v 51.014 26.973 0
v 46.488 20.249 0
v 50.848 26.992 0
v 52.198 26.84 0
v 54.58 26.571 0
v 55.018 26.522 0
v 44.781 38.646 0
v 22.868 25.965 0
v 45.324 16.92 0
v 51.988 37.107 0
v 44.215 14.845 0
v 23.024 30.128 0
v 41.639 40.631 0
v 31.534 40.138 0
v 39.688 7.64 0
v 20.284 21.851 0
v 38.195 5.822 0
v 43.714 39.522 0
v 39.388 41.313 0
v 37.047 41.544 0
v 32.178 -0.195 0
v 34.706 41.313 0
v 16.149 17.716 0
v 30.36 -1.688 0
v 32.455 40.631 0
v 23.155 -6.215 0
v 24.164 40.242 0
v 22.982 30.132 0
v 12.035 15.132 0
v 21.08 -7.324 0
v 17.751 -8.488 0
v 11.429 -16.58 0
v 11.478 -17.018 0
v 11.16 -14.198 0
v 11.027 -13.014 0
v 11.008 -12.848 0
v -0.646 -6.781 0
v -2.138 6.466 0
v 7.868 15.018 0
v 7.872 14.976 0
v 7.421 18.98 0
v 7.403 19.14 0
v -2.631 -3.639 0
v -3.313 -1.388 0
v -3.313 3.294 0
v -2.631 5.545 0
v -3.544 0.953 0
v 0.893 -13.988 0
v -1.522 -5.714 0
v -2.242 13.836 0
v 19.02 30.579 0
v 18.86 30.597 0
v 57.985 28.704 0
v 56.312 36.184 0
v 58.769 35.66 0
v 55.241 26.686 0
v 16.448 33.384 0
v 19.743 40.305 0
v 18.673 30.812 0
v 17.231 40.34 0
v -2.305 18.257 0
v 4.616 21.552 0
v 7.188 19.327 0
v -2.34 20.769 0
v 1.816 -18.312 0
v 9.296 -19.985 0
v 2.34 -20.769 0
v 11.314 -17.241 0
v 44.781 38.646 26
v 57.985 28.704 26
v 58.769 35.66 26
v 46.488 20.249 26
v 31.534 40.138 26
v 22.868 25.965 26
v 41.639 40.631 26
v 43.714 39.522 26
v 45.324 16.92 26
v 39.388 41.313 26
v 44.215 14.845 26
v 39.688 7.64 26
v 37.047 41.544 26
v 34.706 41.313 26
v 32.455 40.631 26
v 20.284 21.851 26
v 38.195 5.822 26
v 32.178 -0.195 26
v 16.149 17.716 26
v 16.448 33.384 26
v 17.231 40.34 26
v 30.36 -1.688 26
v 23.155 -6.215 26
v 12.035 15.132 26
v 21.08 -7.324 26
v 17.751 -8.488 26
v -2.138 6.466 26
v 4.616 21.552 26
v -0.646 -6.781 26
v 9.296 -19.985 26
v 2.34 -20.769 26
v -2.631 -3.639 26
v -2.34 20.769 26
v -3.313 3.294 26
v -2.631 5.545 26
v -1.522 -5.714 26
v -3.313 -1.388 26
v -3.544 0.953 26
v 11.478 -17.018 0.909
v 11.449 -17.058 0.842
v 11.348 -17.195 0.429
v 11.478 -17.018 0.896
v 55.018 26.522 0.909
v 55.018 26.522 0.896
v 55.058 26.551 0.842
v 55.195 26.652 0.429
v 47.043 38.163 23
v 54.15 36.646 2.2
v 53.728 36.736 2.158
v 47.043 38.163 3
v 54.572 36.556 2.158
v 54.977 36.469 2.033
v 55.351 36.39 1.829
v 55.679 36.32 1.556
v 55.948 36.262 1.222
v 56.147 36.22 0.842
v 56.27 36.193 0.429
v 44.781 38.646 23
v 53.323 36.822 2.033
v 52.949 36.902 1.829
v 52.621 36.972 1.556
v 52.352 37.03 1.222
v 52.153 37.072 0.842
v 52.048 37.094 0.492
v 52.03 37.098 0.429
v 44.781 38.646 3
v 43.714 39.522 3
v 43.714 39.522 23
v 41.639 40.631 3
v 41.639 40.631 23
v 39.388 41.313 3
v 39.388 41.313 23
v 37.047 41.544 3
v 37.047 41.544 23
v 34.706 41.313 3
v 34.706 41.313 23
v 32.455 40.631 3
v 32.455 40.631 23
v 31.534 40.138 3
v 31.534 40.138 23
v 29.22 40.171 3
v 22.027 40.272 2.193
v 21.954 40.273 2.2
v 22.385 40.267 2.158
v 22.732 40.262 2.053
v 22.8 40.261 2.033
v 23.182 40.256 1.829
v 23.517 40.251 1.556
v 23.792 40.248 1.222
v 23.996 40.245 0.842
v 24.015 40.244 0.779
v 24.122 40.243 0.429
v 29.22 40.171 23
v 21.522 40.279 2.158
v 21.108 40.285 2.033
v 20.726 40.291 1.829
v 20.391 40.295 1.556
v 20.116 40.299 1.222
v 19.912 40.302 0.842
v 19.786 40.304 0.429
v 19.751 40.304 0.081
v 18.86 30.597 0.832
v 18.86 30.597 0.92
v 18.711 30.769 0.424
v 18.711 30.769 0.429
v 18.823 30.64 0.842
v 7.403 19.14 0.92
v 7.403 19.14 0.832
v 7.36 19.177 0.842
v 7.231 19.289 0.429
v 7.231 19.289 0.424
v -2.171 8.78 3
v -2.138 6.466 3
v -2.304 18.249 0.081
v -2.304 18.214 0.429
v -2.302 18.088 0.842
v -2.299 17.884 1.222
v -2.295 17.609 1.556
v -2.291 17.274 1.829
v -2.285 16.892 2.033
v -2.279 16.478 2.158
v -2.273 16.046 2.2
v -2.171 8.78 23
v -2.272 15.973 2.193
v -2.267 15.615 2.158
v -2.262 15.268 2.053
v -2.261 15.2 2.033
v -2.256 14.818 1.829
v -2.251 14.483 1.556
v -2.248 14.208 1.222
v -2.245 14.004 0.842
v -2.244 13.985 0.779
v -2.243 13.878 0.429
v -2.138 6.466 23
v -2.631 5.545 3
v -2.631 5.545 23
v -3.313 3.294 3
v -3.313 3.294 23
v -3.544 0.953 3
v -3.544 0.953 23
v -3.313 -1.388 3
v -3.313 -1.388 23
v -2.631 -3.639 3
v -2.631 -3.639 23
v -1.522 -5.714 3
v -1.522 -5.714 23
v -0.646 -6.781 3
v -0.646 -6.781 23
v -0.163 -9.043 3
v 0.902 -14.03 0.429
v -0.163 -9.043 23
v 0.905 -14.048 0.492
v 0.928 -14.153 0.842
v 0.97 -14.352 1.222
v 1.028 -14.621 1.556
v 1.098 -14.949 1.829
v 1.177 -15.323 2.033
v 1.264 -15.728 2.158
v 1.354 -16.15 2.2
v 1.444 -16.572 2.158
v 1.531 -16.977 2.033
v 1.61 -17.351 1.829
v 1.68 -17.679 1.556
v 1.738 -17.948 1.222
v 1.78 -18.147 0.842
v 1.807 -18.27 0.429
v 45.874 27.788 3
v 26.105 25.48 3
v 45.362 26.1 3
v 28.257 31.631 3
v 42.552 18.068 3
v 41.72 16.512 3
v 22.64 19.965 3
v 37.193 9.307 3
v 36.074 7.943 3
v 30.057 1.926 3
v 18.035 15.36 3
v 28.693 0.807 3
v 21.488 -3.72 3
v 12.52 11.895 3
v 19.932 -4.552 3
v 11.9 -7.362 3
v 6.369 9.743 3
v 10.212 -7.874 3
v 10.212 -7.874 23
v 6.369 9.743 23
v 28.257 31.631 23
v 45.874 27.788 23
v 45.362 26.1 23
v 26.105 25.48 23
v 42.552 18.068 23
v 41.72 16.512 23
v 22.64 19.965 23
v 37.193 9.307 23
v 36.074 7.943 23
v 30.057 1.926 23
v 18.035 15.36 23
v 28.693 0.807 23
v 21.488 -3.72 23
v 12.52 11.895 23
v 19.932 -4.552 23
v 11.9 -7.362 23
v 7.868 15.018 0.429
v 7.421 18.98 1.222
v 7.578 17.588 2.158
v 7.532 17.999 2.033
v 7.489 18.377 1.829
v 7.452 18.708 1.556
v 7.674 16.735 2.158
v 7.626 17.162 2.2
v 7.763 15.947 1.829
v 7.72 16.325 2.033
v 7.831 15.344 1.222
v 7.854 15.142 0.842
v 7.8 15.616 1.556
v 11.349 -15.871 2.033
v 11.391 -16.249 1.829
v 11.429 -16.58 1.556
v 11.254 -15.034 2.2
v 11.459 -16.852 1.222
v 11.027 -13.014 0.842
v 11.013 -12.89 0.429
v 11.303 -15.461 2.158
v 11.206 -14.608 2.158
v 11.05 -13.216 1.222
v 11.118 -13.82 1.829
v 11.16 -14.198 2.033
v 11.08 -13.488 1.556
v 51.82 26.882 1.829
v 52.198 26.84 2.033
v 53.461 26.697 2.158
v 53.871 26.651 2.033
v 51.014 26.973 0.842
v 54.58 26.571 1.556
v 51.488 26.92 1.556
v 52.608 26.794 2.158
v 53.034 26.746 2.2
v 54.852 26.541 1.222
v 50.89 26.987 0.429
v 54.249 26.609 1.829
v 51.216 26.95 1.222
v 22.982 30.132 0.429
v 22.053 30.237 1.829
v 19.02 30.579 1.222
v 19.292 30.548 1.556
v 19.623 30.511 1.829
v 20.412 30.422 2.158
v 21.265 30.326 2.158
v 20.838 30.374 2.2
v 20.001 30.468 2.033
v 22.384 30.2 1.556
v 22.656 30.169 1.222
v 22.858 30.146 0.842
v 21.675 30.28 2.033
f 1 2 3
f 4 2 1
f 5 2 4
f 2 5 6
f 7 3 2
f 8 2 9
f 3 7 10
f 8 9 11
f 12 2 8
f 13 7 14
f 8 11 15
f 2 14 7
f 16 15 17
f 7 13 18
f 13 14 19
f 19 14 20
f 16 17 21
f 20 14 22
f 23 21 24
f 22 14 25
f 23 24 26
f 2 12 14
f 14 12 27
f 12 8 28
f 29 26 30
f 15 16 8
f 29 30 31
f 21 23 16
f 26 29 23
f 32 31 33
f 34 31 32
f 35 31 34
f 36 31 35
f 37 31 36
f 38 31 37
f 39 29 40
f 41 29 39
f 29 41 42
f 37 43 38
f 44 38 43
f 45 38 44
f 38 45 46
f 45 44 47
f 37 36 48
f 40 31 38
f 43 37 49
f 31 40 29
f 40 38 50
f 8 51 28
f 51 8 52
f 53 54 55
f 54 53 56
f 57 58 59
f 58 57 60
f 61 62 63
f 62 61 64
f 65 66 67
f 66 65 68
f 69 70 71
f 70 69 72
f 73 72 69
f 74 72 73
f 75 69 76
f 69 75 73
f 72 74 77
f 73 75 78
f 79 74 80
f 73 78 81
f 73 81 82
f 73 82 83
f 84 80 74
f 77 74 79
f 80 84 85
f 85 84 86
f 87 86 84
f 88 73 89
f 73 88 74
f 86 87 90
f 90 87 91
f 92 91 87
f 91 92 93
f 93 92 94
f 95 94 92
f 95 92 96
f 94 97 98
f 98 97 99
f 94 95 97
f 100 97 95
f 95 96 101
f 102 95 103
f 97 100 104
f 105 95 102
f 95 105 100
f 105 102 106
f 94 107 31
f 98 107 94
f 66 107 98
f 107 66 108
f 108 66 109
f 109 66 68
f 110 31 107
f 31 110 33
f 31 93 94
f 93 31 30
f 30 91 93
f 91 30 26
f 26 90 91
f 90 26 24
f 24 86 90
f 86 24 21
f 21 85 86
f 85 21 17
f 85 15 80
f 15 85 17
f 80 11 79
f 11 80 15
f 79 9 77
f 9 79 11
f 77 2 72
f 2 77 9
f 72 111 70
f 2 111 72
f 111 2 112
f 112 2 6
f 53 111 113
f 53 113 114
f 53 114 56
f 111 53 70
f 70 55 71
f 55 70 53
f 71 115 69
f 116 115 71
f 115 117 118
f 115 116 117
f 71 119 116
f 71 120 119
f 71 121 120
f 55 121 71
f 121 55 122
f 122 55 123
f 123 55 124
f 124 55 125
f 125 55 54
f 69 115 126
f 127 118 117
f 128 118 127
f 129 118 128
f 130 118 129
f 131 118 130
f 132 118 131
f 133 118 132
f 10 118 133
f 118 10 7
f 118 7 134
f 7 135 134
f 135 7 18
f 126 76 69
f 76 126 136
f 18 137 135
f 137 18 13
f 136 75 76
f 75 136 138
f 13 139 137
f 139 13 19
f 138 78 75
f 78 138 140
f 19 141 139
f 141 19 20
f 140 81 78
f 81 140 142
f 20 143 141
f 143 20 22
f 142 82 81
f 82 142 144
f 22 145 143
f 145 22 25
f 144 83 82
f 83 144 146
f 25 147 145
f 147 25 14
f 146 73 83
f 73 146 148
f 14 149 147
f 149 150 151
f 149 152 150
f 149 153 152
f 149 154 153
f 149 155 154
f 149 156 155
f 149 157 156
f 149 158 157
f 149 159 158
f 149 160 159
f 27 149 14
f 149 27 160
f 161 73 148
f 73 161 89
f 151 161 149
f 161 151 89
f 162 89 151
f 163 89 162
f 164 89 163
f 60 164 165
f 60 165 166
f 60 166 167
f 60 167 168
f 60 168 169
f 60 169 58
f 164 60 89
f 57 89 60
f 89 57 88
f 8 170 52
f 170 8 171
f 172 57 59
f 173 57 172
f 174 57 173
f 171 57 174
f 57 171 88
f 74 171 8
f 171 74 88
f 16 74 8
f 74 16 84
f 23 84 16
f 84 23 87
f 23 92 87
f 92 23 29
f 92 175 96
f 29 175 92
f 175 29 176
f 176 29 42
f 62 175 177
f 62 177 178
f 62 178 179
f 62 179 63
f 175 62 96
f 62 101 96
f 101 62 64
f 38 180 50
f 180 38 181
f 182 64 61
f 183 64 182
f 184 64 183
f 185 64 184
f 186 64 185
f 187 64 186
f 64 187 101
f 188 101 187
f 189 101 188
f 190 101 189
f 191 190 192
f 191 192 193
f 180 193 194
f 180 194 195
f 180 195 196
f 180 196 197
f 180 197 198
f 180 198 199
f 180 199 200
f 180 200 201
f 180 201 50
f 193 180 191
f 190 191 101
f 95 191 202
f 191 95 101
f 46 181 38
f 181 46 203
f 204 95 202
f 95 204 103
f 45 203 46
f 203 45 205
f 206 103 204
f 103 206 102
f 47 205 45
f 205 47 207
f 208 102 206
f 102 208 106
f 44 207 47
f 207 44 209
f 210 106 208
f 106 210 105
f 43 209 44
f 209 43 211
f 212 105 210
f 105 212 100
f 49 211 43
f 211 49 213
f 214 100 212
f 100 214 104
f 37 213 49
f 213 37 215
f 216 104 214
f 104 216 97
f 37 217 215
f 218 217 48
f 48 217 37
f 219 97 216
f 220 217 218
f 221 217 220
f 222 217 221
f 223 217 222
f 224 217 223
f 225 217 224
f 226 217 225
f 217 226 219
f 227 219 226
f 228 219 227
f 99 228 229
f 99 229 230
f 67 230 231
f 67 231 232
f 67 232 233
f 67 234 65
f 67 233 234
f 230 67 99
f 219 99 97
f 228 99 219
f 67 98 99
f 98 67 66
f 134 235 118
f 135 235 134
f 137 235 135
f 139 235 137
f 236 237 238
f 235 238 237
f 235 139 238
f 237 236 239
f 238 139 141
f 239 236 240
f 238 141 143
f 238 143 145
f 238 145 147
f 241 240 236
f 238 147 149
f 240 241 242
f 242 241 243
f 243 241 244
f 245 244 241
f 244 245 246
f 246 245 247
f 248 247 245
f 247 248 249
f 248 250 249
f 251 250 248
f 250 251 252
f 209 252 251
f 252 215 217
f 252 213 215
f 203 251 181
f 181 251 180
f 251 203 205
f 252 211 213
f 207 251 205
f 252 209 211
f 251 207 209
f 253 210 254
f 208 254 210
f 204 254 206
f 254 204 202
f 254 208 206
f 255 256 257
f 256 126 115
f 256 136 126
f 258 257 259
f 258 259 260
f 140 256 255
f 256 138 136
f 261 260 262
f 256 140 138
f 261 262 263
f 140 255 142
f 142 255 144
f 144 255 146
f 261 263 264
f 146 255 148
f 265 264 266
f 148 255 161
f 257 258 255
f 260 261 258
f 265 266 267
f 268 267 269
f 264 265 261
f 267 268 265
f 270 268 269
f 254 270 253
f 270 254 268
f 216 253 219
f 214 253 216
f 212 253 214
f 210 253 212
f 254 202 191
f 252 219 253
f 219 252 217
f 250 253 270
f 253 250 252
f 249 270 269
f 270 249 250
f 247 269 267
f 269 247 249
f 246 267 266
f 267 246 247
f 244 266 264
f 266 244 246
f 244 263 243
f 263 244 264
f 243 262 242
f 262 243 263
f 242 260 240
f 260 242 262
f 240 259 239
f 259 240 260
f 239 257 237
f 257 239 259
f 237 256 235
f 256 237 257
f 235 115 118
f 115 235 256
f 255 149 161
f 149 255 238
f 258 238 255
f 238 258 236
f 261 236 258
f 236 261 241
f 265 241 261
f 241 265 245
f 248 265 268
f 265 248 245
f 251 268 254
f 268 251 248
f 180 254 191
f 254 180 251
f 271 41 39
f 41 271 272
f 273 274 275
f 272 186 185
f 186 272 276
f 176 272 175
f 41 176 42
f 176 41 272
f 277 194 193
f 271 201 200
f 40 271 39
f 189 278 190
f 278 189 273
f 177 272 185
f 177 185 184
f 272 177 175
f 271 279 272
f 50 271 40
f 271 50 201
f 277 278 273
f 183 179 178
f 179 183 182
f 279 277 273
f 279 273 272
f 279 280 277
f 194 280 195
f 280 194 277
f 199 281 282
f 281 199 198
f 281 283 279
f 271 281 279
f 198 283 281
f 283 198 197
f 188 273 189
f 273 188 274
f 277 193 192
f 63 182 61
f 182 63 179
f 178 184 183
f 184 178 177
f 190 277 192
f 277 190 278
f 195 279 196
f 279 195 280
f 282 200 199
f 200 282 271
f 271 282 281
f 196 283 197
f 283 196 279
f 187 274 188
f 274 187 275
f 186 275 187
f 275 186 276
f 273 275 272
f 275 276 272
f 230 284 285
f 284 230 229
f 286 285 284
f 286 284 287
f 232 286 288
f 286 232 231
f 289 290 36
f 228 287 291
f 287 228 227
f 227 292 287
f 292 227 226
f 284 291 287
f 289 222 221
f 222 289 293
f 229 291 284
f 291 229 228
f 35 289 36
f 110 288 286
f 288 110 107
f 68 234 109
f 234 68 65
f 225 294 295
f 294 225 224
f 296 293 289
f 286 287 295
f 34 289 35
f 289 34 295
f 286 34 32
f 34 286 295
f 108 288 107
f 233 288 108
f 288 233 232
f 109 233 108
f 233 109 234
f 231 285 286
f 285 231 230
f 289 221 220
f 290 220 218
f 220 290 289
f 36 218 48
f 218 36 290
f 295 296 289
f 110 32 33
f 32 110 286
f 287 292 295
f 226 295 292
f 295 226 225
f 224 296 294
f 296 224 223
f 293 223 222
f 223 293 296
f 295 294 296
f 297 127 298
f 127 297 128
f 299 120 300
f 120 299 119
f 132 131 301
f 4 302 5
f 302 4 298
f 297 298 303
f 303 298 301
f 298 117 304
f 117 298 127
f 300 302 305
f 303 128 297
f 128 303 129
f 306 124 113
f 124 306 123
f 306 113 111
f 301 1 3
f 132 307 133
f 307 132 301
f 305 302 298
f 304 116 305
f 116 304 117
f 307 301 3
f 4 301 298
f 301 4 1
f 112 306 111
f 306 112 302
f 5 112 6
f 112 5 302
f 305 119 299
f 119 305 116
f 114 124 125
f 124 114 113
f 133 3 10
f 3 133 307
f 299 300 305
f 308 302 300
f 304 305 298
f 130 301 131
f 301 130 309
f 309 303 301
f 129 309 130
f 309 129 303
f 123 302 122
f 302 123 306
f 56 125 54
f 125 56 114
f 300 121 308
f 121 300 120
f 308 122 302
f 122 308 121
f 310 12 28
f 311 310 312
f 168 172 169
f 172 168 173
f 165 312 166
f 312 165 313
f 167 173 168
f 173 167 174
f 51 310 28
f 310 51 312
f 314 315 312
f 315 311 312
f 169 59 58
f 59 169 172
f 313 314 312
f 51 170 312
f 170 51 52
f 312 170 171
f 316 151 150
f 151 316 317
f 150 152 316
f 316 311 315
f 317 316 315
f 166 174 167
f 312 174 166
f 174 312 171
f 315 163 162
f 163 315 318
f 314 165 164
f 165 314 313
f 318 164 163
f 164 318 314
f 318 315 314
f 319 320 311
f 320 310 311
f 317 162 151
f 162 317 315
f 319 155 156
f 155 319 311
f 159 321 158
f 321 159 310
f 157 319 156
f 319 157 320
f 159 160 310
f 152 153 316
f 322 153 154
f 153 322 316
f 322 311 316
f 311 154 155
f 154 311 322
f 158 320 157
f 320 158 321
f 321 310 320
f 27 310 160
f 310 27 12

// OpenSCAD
$fn = 32;

// ----------------------------------------------------------------------
// Air duct: 24 mm duct, 3 mm wall, 26 mm across
// ----------------------------------------------------------------------

// --- parameters (mm) ---
duct_r = 12;              // duct core radius
duct_d = 24;              // duct core diameter
wall = 3;                 // duct wall thickness
height = 26;              // duct width (extrusion height)
port_r = 20.9;            // port flange half width
port_d = 41.8;            // port flange width
port_t = 7;               // port flange thickness
bolt_d = 4.4;             // port bolt holes
bolt_offset = 16.2;       // bolt hole offset from the port axis

difference() {
  /* outer hull chain: tube with a flat flange plate at every port */
  linear_extrude(height = 26) {
    hull() {
      polygon([[2.34, -20.769], [-2.34, 20.769], [4.616, 21.552], [9.296, -19.985]]);
      translate([9.937, 1.12]) circle(r = 12);
    }
    hull() {
      translate([9.937, 1.12]) circle(r = 12);
      translate([8.456, 0.953]) circle(r = 12);
    }
    hull() {
      translate([8.456, 0.953]) circle(r = 12);
      translate([16.488, 3.763]) circle(r = 12);
    }
    hull() {
      translate([16.488, 3.763]) circle(r = 12);
      translate([23.693, 8.29]) circle(r = 12);
    }
    hull() {
      translate([23.693, 8.29]) circle(r = 12);
      translate([29.71, 14.307]) circle(r = 12);
    }
    hull() {
      translate([29.71, 14.307]) circle(r = 12);
      translate([34.237, 21.512]) circle(r = 12);
    }
    hull() {
      translate([34.237, 21.512]) circle(r = 12);
      translate([37.047, 29.544]) circle(r = 12);
    }
    hull() {
      translate([37.047, 29.544]) circle(r = 12);
      translate([36.88, 28.063]) circle(r = 12);
    }
    hull() {
      translate([36.88, 28.063]) circle(r = 12);
      polygon([[17.231, 40.34], [58.769, 35.66], [57.985, 28.704], [16.448, 33.384]]);
    }
  }
  /* air passage: the same chain inset by the wall, 5 mm proud of the ports */
  translate([0, 0, 3]) linear_extrude(height = 20) {
    hull() {
      translate([-4.969, -0.56]) circle(r = 9);
      translate([8.456, 0.953]) circle(r = 9);
    }
    hull() {
      translate([8.456, 0.953]) circle(r = 9);
      translate([16.488, 3.763]) circle(r = 9);
    }
    hull() {
      translate([16.488, 3.763]) circle(r = 9);
      translate([23.693, 8.29]) circle(r = 9);
    }
    hull() {
      translate([23.693, 8.29]) circle(r = 9);
      translate([29.71, 14.307]) circle(r = 9);
    }
    hull() {
      translate([29.71, 14.307]) circle(r = 9);
      translate([34.237, 21.512]) circle(r = 9);
    }
    hull() {
      translate([34.237, 21.512]) circle(r = 9);
      translate([37.047, 29.544]) circle(r = 9);
    }
    hull() {
      translate([37.047, 29.544]) circle(r = 9);
      translate([38.56, 42.969]) circle(r = 9);
    }
  }
  translate([0, 0]) rotate([0, 0, -83.57]) translate([-16.2, -2.5]) rotate([-90, 0, 0]) cylinder(h = 12, d = 4.4);
  translate([0, 0]) rotate([0, 0, -83.57]) translate([16.2, -2.5]) rotate([-90, 0, 0]) cylinder(h = 12, d = 4.4);
  translate([38, 38]) rotate([0, 0, 173.57]) translate([-16.2, -2.5]) rotate([-90, 0, 0]) cylinder(h = 12, d = 4.4);
  translate([38, 38]) rotate([0, 0, 173.57]) translate([16.2, -2.5]) rotate([-90, 0, 0]) cylinder(h = 12, d = 4.4);
}
